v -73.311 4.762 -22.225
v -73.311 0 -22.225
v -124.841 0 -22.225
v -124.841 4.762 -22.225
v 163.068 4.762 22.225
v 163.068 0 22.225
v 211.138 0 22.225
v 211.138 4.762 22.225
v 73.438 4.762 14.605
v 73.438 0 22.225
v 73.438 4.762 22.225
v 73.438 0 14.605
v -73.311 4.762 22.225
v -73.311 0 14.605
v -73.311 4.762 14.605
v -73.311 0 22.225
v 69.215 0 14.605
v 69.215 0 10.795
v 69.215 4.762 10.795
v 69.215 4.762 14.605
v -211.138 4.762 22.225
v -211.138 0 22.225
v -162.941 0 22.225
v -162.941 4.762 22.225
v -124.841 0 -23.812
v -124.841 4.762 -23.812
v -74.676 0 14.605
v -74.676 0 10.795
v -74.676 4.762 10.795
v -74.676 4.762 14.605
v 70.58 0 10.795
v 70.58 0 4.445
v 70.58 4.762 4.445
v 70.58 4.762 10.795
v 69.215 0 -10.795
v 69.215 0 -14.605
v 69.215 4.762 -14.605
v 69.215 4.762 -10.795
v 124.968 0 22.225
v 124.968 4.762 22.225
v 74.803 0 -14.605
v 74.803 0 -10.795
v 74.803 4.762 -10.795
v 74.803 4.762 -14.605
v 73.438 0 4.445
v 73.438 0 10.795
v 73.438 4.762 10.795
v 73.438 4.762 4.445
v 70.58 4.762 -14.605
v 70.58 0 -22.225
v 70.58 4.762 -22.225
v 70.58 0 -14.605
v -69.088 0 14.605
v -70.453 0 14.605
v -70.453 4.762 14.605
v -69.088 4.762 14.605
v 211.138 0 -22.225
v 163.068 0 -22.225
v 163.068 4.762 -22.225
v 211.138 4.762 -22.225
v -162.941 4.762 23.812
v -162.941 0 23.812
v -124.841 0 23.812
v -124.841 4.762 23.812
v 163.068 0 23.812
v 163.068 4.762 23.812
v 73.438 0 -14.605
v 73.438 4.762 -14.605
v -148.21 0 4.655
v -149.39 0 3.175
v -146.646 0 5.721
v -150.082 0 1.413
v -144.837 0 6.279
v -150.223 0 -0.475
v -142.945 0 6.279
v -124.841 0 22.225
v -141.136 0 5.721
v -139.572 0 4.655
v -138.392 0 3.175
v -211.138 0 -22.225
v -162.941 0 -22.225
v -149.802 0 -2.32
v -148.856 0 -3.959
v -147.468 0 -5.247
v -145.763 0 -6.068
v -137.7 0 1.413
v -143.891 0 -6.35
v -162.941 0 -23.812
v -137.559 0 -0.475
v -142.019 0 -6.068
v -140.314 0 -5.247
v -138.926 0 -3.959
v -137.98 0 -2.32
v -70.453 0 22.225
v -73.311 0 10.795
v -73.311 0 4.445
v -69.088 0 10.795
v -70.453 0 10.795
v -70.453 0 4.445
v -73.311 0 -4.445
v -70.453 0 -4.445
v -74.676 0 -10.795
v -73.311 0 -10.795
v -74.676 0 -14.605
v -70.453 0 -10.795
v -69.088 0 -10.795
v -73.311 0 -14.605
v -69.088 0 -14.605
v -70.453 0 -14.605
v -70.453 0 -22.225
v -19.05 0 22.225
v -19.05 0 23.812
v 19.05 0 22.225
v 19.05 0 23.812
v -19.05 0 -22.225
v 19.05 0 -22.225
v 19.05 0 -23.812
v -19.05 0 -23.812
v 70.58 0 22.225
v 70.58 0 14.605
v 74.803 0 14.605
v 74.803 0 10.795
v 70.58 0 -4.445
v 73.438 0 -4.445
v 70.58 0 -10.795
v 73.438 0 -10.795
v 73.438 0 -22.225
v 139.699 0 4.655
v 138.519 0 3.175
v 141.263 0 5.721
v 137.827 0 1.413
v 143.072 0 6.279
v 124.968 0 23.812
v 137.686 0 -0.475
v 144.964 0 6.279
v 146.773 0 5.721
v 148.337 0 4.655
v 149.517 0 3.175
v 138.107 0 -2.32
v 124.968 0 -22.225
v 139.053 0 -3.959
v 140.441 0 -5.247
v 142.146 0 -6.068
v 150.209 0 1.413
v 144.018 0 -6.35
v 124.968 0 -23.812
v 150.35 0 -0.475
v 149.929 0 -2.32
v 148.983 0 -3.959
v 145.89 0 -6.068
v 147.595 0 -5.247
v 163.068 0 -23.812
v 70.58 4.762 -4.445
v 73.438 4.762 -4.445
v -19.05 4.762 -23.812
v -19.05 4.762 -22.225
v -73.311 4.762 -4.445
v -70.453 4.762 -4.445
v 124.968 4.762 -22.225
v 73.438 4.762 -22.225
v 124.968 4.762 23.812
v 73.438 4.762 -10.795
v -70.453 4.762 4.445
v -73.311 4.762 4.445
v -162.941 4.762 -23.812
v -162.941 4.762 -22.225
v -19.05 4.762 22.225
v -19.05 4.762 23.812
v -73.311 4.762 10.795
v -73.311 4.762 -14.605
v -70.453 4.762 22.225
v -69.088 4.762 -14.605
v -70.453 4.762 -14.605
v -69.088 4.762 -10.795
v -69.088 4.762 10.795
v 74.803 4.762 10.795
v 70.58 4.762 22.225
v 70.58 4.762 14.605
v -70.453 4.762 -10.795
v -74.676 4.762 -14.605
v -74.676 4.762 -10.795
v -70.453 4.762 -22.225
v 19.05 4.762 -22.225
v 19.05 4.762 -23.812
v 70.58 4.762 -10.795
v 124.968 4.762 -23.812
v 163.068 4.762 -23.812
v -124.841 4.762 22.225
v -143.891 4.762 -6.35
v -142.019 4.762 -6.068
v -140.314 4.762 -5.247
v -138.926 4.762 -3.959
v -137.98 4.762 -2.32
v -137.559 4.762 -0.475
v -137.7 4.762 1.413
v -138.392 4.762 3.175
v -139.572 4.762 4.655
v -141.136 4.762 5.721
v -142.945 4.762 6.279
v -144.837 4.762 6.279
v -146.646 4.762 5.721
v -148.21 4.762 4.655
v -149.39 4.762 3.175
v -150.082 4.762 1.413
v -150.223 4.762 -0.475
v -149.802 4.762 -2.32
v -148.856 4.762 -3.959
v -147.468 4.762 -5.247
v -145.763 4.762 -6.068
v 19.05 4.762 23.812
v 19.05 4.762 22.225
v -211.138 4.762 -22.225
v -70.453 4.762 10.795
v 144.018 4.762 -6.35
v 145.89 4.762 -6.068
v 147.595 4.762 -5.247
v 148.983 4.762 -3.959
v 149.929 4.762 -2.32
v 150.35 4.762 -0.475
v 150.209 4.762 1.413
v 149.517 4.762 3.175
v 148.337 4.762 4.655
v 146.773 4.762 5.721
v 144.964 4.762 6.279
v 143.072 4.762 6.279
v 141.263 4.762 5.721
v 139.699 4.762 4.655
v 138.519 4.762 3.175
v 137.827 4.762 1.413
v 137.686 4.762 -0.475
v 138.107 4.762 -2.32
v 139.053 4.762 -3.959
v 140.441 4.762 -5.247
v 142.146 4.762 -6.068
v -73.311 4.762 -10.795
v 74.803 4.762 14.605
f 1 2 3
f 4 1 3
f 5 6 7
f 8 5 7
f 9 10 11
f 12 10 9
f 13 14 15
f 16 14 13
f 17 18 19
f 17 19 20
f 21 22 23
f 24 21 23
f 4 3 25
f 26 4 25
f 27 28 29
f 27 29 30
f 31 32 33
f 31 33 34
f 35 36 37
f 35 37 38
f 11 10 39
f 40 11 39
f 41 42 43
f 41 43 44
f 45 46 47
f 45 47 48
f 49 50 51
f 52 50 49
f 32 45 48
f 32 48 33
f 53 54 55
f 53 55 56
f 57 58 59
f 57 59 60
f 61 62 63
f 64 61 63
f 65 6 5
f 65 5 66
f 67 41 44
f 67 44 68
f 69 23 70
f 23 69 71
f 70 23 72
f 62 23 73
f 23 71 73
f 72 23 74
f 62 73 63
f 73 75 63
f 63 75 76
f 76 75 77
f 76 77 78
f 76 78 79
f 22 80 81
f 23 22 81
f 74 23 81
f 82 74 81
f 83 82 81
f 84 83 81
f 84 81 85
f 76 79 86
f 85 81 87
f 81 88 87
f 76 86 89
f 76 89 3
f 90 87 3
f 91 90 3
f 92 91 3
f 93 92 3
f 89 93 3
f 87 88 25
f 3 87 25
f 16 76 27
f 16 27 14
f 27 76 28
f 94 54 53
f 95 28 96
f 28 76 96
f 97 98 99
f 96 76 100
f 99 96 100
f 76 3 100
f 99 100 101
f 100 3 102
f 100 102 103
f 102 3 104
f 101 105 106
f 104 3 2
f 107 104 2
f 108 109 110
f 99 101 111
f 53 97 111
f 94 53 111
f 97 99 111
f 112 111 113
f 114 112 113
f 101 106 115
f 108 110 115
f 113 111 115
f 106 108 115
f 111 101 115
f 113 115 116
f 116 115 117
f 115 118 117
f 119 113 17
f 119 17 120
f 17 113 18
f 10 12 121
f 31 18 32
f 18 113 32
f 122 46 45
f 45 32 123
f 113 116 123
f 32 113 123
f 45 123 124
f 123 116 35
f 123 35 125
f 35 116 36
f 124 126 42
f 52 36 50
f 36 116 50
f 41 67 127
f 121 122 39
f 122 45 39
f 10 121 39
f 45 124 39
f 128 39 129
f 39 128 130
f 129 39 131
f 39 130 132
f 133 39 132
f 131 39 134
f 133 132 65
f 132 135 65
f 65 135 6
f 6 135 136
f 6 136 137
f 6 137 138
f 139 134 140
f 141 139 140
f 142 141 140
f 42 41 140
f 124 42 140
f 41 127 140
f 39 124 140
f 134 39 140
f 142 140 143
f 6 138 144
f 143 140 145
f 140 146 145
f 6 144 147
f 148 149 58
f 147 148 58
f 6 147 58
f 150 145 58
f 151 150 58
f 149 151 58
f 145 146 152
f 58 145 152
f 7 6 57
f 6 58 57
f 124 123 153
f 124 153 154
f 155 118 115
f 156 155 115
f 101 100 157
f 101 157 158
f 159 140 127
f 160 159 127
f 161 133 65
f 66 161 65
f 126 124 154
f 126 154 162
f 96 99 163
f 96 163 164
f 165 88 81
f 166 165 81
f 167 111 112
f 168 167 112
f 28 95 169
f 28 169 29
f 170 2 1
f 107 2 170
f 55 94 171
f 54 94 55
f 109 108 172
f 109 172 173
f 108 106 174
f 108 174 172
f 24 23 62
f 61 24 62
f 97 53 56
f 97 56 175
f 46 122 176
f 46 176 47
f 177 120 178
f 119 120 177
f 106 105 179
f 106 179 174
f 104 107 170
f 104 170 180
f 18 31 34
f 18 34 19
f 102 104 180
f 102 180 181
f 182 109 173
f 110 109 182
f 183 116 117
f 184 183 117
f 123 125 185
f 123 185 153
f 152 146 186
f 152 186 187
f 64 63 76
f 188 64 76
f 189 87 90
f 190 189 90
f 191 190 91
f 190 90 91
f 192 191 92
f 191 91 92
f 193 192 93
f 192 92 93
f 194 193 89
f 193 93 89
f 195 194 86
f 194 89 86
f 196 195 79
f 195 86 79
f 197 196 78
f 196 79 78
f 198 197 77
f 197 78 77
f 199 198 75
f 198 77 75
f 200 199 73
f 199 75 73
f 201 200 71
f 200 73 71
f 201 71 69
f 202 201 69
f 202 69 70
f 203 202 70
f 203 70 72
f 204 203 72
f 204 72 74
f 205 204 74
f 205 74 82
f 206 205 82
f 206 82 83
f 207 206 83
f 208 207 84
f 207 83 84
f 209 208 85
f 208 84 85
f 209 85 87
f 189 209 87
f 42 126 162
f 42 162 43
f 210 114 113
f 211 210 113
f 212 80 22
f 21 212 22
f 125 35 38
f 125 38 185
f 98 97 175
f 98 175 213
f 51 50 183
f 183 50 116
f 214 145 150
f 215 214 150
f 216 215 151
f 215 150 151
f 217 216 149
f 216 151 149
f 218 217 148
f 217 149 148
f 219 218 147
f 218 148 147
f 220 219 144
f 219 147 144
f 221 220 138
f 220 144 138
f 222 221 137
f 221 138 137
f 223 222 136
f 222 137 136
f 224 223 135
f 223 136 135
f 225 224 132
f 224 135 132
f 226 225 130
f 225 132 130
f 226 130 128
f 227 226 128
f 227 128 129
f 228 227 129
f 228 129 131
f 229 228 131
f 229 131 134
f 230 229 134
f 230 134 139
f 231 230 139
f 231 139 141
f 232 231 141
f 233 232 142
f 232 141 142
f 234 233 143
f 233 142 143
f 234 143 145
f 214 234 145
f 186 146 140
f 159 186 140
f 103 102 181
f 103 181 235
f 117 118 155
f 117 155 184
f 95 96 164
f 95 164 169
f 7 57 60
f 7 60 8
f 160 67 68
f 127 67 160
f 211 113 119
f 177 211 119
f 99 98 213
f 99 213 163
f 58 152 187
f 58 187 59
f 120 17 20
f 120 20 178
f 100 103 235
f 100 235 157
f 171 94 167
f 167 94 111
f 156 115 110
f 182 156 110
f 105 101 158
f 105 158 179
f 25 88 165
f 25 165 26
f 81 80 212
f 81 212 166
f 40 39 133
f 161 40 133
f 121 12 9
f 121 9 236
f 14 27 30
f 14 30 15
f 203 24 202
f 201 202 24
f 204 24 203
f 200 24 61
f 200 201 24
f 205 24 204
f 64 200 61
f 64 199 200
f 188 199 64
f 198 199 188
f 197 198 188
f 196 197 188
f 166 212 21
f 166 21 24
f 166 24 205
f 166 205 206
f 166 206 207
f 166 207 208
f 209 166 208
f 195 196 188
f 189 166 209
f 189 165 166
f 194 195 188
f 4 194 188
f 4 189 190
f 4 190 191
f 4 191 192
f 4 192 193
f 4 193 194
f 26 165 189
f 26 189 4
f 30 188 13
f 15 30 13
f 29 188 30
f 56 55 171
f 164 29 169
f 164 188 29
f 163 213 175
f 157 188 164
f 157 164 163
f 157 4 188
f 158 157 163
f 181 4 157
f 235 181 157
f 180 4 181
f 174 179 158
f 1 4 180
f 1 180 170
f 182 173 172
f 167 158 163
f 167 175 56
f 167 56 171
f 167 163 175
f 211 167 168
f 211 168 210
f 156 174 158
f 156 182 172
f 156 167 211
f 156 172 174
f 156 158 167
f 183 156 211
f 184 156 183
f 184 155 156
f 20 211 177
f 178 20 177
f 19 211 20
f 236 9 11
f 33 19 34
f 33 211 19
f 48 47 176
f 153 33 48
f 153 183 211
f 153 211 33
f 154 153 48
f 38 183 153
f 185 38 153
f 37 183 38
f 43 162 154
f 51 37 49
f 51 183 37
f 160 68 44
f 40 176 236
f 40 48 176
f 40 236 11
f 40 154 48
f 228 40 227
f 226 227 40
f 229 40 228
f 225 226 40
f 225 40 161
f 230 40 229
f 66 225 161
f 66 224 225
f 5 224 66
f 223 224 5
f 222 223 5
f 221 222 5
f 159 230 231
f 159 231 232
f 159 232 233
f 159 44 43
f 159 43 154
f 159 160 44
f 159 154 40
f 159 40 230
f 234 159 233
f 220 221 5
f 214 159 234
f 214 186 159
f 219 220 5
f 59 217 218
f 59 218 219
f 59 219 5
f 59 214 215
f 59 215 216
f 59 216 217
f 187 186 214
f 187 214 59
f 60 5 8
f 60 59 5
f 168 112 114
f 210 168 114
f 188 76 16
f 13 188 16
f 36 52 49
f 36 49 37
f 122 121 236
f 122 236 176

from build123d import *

# Parameters (mm, degrees)
SKETCH1_W           = 428.625
SKETCH1_H           = 47.625
BOSS_EXTRUDE1_DEPTH = 4.7625
SKETCH2_W           = 51.2445
SKETCH2_H           = 1.5875
SKETCH2_W_2         = 51.3715
CUT_EXTRUDE4_DEPTH  = 4.7625
SKETCH4_W           = 3.175
SKETCH4_H           = 44.45
CUT_EXTRUDE5_DEPTH  = 4.7625
SKETCH3_R           = 6.35
CUT_EXTRUDE6_DEPTH  = 4.7625


with BuildPart() as part:
    # Sketch1 → Boss-Extrude1 (new body)
    with BuildSketch(Plane(origin=(0, 0, 0), x_dir=(1, 0, 0), z_dir=(0, 1, 0))):
        Rectangle(SKETCH1_W, SKETCH1_H)
    extrude(amount=BOSS_EXTRUDE1_DEPTH)

    # Sketch2 → Cut-Extrude4 (cut)
    with BuildSketch(Plane.XZ):
        Polygon((-124.841, -22.225), (-124.841, -23.8125), (-19.05, -23.8125), (-19.05, -22.225), (-70.45325, -22.225), (-73.31075, -22.225), align=None)
        with Locations((188.69025, 23.01875)):
            Rectangle(SKETCH2_W, SKETCH2_H)
        Polygon((19.05, 23.8125), (19.05, 22.225), (70.58025, 22.225), (73.43775, 22.225), (124.968, 22.225), (124.968, 23.8125), align=None)
        Polygon((-124.841, 22.225), (-73.31075, 22.225), (-70.45325, 22.225), (-19.05, 22.225), (-19.05, 23.8125), (-124.841, 23.8125), align=None)
        Polygon((19.05, -22.225), (19.05, -23.8125), (124.968, -23.8125), (124.968, -22.225), (73.43775, -22.225), (70.58025, -22.225), align=None)
        with Locations((188.69025, -23.01875)):
            Rectangle(SKETCH2_W, SKETCH2_H)
        with Locations((-188.62675, 23.01875)):
            Rectangle(SKETCH2_W_2, SKETCH2_H)
        with Locations((-188.62675, -23.01875)):
            Rectangle(SKETCH2_W_2, SKETCH2_H)
        Polygon((-70.45325, -4.445), (-70.45325, -10.795), (-69.088, -10.795), (-69.088, -14.605), (-70.45325, -14.605), (-70.45325, -22.225), (-73.31075, -22.225), (-73.31075, -14.605), (-74.676, -14.605), (-74.676, -10.795), (-73.31075, -10.795), (-73.31075, -4.445), align=None)
        Polygon((-70.45325, 4.445), (-73.31075, 4.445), (-73.31075, 10.795), (-74.676, 10.795), (-74.676, 14.605), (-73.31075, 14.605), (-73.31075, 22.225), (-70.45325, 22.225), (-70.45325, 14.605), (-69.088, 14.605), (-69.088, 10.795), (-70.45325, 10.795), align=None)
        Polygon((73.43775, 4.445), (70.58025, 4.445), (70.58025, 10.795), (69.215, 10.795), (69.215, 14.605), (70.58025, 14.605), (70.58025, 22.225), (73.43775, 22.225), (73.43775, 14.605), (74.803, 14.605), (74.803, 10.795), (73.43775, 10.795), align=None)
        Polygon((73.43775, -4.445), (73.43775, -10.795), (74.803, -10.795), (74.803, -14.605), (73.43775, -14.605), (73.43775, -22.225), (70.58025, -22.225), (70.58025, -14.605), (69.215, -14.605), (69.215, -10.795), (70.58025, -10.795), (70.58025, -4.445), align=None)
    extrude(amount=-CUT_EXTRUDE4_DEPTH, mode=Mode.SUBTRACT)

    # Sketch4 → Cut-Extrude5 (cut)
    with BuildSketch(Plane.XZ):
        with Locations((-212.725, 0)):
            Rectangle(SKETCH4_W, SKETCH4_H)
        with Locations((212.725, 0)):
            Rectangle(SKETCH4_W, SKETCH4_H)
    extrude(amount=-CUT_EXTRUDE5_DEPTH, mode=Mode.SUBTRACT)

    # Sketch3 → Cut-Extrude6 (cut)
    with BuildSketch(Plane.XZ):
        with Locations(Location((-143.891, 0, 0), (0, 0, 270))):
            Circle(SKETCH3_R)
        with Locations(Location((144.018, 0, 0), (0, 0, 270))):
            Circle(SKETCH3_R)
    extrude(amount=-CUT_EXTRUDE6_DEPTH, mode=Mode.SUBTRACT)


solid = part.part
